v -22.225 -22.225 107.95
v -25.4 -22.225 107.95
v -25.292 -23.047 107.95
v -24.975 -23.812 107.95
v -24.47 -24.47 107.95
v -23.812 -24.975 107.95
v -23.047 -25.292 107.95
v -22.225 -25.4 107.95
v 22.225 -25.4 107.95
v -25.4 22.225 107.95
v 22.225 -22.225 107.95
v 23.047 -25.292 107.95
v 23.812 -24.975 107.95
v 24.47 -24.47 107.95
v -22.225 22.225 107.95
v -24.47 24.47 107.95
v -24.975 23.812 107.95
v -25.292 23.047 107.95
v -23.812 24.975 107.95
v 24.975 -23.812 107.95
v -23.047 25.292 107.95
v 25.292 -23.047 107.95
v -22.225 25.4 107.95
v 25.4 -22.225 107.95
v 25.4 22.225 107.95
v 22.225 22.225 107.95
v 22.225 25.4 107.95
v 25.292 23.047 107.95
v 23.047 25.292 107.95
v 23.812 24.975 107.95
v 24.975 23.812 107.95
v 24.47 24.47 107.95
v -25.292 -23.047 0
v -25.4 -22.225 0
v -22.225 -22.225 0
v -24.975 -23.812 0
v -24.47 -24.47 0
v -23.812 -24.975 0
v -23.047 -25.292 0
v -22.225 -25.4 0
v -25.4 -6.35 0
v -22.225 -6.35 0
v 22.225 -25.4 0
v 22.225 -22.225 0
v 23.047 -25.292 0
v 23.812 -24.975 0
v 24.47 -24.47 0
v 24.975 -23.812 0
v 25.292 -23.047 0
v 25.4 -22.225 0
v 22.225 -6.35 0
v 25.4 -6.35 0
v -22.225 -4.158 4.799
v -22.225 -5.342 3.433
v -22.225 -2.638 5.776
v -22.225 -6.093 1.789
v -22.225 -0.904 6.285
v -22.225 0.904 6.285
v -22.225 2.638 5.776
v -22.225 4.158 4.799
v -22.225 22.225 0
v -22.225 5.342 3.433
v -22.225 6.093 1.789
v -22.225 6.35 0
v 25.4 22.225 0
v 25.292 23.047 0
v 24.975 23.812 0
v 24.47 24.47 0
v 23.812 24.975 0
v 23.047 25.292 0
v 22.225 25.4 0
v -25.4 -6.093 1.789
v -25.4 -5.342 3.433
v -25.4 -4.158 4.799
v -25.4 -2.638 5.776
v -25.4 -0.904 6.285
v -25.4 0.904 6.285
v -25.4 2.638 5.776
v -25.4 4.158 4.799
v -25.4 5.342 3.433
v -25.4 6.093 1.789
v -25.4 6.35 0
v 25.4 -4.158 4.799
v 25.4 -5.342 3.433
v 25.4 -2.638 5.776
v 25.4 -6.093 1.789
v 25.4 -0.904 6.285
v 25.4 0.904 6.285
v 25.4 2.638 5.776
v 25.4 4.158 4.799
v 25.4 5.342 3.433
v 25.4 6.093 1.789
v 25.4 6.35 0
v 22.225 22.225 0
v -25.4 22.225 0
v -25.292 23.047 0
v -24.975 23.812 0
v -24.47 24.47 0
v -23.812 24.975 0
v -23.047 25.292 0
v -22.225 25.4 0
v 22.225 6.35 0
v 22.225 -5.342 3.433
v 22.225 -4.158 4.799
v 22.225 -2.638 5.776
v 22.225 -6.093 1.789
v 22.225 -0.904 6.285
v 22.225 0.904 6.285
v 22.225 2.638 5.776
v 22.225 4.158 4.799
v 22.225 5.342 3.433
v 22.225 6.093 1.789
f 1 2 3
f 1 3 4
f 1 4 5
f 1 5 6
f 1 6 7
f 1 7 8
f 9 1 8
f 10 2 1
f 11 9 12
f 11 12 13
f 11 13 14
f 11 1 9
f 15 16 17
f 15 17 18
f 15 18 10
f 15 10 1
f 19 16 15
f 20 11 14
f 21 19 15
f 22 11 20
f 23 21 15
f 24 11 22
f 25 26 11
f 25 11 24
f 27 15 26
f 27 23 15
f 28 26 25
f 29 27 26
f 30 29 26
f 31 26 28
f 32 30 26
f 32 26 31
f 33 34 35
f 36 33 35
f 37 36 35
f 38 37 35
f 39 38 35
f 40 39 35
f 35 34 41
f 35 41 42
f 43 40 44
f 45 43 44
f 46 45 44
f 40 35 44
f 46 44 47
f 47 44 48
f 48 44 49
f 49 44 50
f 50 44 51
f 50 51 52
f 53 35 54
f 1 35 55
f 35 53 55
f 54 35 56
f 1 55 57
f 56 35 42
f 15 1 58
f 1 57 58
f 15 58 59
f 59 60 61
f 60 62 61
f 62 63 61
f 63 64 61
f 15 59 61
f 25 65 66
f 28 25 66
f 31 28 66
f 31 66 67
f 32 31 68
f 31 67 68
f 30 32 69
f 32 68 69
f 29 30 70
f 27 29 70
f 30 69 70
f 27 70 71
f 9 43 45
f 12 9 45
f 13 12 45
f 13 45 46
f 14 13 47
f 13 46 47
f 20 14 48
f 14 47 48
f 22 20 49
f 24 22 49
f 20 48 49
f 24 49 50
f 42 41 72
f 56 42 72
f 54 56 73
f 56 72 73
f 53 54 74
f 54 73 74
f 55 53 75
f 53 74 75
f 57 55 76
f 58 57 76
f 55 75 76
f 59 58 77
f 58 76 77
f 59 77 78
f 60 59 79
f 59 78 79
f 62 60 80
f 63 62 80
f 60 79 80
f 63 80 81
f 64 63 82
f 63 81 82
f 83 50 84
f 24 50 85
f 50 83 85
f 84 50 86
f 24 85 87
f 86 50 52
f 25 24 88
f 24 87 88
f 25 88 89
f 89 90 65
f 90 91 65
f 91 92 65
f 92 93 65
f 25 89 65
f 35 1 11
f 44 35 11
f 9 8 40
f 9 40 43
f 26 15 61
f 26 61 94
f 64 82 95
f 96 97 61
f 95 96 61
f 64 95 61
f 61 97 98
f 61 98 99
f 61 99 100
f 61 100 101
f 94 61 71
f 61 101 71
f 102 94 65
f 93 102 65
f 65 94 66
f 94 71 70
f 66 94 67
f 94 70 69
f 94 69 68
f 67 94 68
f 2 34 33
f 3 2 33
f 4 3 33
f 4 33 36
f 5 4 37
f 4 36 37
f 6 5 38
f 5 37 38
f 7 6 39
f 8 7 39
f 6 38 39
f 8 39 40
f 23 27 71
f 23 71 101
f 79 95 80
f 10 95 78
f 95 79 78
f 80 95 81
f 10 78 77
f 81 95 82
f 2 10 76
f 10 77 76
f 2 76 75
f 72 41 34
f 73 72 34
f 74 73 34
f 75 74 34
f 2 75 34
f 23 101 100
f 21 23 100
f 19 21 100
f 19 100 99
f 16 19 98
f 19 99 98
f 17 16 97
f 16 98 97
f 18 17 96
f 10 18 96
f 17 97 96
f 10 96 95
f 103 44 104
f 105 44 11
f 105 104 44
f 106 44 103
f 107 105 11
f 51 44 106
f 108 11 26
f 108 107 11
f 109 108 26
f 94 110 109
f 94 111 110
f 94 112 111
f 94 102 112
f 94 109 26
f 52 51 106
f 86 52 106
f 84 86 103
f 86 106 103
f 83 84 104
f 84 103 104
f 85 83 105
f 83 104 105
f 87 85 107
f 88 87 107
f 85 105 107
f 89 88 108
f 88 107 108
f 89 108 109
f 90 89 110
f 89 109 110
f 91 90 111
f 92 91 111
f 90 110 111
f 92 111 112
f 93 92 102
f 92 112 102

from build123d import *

# Parameters (mm, degrees)
F0_W     = 44.45
F0_H     = 44.45
F1_DEPTH = 107.95
F3_D     = 12.7


with BuildPart() as f1:
    # F0 (on Top) → F1 (new body)
    with BuildSketch(Plane.XY):
        with BuildLine():
            ThreePointArc((25.4, 22.225), (24.470064, 24.470064), (22.225, 25.4))
            Line((22.225, 25.4), (-22.225, 25.4))
            ThreePointArc((-22.225, 25.4), (-24.470064, 24.470064), (-25.4, 22.225))
            Line((-25.4, 22.225), (-25.4, -22.225))
            ThreePointArc((-25.4, -22.225), (-24.470064, -24.470064), (-22.225, -25.4))
            Line((-22.225, -25.4), (22.225, -25.4))
            ThreePointArc((22.225, -25.4), (24.470064, -24.470064), (25.4, -22.225))
            Line((25.4, -22.225), (25.4, 22.225))
        make_face()
        Rectangle(F0_W, F0_H, mode=Mode.SUBTRACT)
    extrude(amount=F1_DEPTH)

    # F3 (through all)
    with Locations(Plane.YZ.offset(25.4)):
        with Locations((0, 0)):
            Hole(F3_D / 2)


solid = f1.part
